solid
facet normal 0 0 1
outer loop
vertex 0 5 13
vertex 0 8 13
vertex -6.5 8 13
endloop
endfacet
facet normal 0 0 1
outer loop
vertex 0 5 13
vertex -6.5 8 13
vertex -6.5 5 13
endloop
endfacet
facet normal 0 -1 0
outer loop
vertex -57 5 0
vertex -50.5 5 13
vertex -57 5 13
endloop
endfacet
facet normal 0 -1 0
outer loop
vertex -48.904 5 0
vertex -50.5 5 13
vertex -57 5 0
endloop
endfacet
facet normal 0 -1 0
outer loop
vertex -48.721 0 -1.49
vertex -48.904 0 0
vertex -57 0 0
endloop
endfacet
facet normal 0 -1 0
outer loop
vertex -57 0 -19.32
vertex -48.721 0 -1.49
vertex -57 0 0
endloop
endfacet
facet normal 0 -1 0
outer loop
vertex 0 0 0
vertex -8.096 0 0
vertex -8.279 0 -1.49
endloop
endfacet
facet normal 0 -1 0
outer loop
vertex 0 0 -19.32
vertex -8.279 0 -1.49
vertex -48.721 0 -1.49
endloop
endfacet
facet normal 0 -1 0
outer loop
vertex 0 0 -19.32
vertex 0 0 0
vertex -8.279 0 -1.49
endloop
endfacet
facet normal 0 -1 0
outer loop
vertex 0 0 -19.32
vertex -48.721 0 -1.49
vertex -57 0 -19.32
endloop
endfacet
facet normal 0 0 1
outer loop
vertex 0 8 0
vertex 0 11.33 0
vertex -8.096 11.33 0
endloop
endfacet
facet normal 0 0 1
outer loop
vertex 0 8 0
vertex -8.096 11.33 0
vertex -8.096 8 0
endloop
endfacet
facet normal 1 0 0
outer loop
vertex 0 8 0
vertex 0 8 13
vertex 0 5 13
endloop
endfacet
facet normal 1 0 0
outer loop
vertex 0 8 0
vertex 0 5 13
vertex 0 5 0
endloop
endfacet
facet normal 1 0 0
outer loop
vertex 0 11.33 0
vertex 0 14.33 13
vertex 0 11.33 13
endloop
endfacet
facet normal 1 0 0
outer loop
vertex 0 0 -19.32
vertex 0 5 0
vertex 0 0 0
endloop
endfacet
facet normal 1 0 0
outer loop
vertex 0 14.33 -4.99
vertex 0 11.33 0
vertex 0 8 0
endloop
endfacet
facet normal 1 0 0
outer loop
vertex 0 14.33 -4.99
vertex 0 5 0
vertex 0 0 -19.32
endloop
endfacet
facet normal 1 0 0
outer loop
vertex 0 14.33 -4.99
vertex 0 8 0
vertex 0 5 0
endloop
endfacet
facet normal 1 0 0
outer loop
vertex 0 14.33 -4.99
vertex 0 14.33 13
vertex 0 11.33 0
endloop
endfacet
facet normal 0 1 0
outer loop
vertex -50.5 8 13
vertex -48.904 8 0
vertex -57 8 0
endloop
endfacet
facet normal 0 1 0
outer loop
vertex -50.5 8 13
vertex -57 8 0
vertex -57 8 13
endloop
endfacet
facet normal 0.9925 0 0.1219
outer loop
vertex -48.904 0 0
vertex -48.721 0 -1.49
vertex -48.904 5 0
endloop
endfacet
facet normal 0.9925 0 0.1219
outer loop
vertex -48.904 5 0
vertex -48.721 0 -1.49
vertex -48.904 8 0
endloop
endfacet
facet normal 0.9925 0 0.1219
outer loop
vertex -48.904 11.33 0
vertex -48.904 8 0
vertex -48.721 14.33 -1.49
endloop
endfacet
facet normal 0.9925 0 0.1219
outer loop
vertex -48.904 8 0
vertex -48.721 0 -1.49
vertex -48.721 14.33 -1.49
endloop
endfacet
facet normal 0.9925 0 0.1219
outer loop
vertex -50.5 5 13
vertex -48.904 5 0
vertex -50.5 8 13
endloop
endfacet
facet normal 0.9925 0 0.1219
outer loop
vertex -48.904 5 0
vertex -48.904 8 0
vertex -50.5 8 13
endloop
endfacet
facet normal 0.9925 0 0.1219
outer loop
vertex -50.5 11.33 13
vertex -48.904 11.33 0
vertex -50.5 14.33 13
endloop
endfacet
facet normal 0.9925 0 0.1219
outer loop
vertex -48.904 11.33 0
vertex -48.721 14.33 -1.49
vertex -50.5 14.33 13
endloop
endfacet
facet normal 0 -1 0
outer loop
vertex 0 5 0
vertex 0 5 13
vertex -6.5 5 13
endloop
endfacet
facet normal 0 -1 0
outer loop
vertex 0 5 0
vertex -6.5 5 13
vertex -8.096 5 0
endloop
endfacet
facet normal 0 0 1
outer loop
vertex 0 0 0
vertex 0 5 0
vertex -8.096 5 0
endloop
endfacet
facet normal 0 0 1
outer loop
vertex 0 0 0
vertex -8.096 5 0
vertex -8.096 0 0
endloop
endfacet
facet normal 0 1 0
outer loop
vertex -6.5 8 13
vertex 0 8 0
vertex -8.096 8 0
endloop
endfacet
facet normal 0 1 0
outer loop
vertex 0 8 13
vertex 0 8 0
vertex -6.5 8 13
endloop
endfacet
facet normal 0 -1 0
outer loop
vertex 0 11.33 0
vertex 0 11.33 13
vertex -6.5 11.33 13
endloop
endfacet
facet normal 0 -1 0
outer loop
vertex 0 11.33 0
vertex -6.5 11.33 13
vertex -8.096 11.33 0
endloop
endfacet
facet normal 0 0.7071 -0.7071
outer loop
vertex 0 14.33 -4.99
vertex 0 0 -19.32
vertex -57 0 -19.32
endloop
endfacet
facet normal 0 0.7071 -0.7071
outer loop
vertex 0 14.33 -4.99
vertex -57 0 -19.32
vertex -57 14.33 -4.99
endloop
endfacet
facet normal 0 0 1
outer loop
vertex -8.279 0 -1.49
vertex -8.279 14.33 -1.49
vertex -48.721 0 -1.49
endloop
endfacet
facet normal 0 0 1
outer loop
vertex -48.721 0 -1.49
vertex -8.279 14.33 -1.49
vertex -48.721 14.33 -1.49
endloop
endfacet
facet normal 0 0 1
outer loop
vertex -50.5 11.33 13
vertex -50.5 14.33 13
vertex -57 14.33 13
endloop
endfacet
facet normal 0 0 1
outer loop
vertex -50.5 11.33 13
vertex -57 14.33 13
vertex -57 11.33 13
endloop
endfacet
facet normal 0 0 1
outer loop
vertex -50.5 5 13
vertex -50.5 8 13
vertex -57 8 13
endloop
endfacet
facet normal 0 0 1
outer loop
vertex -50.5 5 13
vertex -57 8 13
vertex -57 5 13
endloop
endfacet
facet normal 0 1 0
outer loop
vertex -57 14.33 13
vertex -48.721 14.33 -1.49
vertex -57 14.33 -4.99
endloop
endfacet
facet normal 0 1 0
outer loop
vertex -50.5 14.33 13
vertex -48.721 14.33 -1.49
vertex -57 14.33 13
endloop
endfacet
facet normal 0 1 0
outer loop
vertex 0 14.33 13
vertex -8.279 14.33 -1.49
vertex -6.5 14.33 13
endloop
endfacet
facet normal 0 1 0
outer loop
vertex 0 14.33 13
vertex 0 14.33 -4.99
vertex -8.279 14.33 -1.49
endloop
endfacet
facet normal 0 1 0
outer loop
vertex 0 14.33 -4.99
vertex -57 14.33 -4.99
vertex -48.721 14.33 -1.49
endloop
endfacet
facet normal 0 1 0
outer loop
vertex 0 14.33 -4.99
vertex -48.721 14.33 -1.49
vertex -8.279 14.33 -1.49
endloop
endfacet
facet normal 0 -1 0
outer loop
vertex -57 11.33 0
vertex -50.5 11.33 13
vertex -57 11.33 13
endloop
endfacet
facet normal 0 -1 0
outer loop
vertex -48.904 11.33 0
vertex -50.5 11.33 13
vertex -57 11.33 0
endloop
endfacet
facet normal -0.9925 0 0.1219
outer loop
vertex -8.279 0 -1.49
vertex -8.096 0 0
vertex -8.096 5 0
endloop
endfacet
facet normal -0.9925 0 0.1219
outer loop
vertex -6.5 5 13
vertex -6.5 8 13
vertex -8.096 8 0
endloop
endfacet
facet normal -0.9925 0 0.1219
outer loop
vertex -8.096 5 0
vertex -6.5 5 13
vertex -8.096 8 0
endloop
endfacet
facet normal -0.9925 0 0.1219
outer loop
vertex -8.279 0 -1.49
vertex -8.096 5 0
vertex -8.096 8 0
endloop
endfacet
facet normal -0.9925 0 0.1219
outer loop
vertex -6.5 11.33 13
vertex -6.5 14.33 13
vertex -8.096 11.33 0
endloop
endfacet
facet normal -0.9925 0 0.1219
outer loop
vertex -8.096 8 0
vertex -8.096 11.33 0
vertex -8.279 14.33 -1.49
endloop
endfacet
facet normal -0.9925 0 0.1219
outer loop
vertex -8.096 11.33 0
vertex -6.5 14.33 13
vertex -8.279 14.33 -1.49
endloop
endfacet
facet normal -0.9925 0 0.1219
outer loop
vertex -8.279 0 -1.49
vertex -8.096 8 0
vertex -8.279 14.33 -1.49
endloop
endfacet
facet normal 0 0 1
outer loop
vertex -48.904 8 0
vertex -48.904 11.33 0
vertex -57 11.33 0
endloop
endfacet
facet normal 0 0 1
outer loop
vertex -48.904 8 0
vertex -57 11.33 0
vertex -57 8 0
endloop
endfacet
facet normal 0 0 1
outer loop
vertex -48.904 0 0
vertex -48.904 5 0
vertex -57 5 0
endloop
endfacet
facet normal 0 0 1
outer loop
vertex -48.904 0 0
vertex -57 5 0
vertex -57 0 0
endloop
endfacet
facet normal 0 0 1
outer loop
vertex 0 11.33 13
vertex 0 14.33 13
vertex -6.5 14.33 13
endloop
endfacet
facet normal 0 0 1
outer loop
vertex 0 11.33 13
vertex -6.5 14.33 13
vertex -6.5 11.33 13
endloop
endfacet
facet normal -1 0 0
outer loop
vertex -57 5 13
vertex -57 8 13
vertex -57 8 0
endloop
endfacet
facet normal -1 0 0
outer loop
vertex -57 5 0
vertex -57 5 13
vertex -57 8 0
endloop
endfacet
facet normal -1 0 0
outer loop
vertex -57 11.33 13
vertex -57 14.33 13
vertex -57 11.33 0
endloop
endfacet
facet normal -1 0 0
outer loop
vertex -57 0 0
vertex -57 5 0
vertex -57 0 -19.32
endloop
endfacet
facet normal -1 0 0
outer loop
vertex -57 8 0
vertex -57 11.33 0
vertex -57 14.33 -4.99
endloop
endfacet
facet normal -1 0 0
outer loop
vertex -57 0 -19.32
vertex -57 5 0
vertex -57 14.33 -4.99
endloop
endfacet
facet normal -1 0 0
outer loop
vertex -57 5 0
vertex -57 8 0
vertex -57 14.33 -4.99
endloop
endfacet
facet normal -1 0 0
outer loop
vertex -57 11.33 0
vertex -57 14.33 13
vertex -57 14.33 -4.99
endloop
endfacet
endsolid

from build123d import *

# Parameters (mm, degrees)
BOSS_EXTRUDE1_DEPTH = 57
CUT_EXTRUDE1_REACH  = 63.868


with BuildPart() as part:
    # Sketch1 → Boss-Extrude1 (new body)
    with BuildSketch(Plane(origin=(0, 0, 0), x_dir=(0, 0, -1), z_dir=(1, 0, 0))):
        Polygon((0, 0), (19.32, 0), (4.99, 14.33), (-13, 14.33), (-13, 11.33), (0, 11.33), (0, 8), (-13, 8), (-13, 5), (0, 5), align=None)
    extrude(amount=-BOSS_EXTRUDE1_DEPTH)

    # Sketch2 → Cut-Extrude1 (cut, up to next)
    with BuildSketch(Plane(origin=(0, 14.33, 0), x_dir=(1, 0, 0), z_dir=(0, 1, 0)), mode=Mode.PRIVATE) as cut_extrude1_sk1:
        Polygon((-6.5, -13), (-8.279148287, 1.49), (-48.720851713, 1.49), (-50.5, -13), align=None)
    cut_extrude1_tool1 = extrude(cut_extrude1_sk1.sketch, amount=-CUT_EXTRUDE1_REACH, mode=Mode.PRIVATE) & part.part
    add(cut_extrude1_tool1.solids().sort_by_distance((-28.5, 14.33, 5.856766))[0], mode=Mode.SUBTRACT)


solid = part.part
